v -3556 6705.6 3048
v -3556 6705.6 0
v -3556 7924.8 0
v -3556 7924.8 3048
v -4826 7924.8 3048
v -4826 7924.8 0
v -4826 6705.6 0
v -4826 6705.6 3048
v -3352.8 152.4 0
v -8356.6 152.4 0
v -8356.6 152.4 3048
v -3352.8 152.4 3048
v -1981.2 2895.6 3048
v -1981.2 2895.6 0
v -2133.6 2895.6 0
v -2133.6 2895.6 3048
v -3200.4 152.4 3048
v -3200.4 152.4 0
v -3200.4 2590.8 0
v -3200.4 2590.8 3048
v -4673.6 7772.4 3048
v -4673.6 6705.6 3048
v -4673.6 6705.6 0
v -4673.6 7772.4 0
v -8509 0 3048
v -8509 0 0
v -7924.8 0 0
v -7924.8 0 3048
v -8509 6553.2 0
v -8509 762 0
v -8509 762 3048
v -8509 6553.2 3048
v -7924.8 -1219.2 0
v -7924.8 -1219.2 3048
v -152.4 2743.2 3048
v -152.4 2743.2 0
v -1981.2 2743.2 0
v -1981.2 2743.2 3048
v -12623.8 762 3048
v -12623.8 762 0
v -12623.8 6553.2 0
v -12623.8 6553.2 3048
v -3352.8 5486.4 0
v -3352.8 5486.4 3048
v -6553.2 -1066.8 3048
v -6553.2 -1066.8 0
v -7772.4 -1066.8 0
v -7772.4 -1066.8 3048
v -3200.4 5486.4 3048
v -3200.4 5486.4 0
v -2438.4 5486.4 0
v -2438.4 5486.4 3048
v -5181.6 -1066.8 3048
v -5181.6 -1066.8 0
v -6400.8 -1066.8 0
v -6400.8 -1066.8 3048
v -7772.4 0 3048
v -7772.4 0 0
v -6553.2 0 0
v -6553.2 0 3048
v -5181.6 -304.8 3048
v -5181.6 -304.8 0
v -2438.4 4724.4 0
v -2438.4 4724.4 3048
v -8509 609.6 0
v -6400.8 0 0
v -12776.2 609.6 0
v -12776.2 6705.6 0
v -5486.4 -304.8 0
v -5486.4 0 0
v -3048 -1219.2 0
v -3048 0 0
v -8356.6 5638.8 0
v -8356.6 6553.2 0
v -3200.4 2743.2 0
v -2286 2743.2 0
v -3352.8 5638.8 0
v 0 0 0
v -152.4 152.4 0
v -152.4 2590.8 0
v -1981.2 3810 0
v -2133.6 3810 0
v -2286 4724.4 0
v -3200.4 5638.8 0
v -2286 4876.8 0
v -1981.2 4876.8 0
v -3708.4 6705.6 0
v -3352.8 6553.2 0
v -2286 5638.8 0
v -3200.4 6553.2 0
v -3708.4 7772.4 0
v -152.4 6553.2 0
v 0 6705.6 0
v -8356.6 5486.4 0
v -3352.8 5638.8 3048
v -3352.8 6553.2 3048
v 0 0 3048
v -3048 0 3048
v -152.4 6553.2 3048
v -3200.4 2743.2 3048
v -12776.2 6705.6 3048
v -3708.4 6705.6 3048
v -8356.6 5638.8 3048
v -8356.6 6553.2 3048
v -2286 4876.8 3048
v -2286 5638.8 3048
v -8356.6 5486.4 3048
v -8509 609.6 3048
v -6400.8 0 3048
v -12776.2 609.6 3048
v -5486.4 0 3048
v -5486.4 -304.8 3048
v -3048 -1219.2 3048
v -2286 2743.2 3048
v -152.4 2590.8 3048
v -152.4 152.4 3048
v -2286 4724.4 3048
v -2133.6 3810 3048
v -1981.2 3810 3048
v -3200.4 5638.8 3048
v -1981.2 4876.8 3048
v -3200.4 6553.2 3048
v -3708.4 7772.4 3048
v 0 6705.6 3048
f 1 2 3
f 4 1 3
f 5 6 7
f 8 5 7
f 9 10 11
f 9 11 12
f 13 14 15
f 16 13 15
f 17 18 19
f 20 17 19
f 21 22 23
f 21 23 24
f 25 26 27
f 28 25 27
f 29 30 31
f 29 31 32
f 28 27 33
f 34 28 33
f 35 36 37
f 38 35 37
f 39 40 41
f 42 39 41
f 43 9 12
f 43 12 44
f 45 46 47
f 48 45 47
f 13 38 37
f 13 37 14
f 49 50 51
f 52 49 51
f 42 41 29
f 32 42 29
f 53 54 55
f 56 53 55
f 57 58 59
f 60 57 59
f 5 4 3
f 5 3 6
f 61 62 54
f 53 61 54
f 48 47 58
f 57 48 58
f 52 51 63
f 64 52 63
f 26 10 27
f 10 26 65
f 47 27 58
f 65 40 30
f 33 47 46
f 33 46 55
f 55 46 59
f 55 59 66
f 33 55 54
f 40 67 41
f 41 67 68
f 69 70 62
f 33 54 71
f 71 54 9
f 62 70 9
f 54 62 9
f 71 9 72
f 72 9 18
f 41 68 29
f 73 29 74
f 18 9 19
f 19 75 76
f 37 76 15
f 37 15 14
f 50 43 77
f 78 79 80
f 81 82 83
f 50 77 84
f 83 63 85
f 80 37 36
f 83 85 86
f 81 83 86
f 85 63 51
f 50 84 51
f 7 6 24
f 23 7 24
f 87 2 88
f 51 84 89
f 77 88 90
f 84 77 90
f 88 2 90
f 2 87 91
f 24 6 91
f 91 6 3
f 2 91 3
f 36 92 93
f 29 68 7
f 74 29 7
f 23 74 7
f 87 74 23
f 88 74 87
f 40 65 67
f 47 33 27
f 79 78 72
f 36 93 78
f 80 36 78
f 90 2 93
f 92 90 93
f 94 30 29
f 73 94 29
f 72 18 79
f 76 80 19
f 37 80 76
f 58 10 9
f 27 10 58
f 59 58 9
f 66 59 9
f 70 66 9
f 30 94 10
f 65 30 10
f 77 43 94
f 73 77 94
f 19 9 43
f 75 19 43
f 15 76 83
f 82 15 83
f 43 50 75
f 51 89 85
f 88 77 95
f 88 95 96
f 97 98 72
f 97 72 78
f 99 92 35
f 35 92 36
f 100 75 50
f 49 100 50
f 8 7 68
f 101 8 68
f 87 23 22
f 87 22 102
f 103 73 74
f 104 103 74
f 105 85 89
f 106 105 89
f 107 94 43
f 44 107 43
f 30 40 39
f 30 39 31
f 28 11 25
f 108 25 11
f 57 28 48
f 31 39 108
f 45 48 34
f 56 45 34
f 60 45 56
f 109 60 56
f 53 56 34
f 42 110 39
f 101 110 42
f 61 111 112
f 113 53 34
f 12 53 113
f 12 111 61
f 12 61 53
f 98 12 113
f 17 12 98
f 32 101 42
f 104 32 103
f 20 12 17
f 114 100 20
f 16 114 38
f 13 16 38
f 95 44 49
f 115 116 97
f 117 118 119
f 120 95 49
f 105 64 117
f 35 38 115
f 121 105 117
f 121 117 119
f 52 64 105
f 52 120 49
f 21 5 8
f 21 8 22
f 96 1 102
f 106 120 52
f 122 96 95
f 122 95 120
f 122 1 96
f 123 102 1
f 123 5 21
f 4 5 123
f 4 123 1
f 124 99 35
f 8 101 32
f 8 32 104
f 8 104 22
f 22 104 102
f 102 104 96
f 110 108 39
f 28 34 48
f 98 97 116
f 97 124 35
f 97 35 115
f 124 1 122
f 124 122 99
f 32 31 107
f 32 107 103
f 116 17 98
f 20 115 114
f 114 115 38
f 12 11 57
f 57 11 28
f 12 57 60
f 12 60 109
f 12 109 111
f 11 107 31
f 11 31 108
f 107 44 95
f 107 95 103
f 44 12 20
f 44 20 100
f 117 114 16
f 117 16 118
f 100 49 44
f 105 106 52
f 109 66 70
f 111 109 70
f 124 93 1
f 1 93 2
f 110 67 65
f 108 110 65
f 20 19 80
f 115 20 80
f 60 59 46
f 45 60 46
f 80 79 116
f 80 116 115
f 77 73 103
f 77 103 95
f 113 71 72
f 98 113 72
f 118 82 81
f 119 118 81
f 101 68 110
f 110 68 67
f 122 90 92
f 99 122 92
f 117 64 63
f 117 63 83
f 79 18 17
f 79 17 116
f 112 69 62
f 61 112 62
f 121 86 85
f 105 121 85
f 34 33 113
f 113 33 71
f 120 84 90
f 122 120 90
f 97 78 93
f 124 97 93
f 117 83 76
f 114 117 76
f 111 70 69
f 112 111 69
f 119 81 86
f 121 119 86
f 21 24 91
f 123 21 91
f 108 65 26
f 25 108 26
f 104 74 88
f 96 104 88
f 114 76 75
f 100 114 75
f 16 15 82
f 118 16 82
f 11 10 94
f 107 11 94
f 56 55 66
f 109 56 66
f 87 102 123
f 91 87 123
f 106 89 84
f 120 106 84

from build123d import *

# Parameters (mm, degrees)
F0_W     = 5003.8
F0_H     = 5334
F0_W_2   = 3048
F0_H_2   = 2438.4
F0_W_3   = 4114.8
F0_H_3   = 5791.2
F0_H_4   = 914.4
F0_W_4   = 965.2
F0_H_5   = 1066.8
F1_DEPTH = 3048


with BuildPart() as f1:
    # F0 (on Top) → F1 (new body)
    with BuildSketch(Plane.XY):
        Polygon((-4826, 6705.6), (-8509, 6705.6), (-12776.2, 6705.6), (-12776.2, 609.6), (-8509, 609.6), (-8509, 0), (-7924.8, 0), (-7772.4, 0), (-6553.2, 0), (-6400.8, 0), (-5486.4, 0), (-3048, 0), (0, 0), (0, 6705.6), (-3556, 6705.6), (-3556, 7924.8), (-4826, 7924.8), align=None)
        with Locations((-5854.7, 2819.4)):
            Rectangle(F0_W, F0_H, mode=Mode.SUBTRACT)
        with Locations((-1676.4, 1371.6)):
            Rectangle(F0_W_2, F0_H_2, mode=Mode.SUBTRACT)
        with Locations((-10566.4, 3657.6)):
            Rectangle(F0_W_3, F0_H_3, mode=Mode.SUBTRACT)
        Polygon((-2286, 2743.2), (-3200.4, 2743.2), (-3200.4, 5486.4), (-2438.4, 5486.4), (-2438.4, 4724.4), (-2286, 4724.4), align=None, mode=Mode.SUBTRACT)
        Polygon((-2286, 5638.8), (-3200.4, 5638.8), (-3200.4, 6553.2), (-152.4, 6553.2), (-152.4, 2743.2), (-1981.2, 2743.2), (-1981.2, 2895.6), (-2133.6, 2895.6), (-2133.6, 3810), (-1981.2, 3810), (-1981.2, 4876.8), (-2286, 4876.8), align=None, mode=Mode.SUBTRACT)
        with Locations((-5854.7, 6096)):
            Rectangle(F0_W, F0_H_4, mode=Mode.SUBTRACT)
        with Locations((-4191, 7239)):
            Rectangle(F0_W_4, F0_H_5, mode=Mode.SUBTRACT)
        Polygon((-7772.4, 0), (-7924.8, 0), (-7924.8, -1219.2), (-3048, -1219.2), (-3048, 0), (-5486.4, 0), (-5486.4, -304.8), (-5181.6, -304.8), (-5181.6, -1066.8), (-6400.8, -1066.8), (-6400.8, 0), (-6553.2, 0), (-6553.2, -1066.8), (-7772.4, -1066.8), align=None)
    extrude(amount=F1_DEPTH)


solid = f1.part
